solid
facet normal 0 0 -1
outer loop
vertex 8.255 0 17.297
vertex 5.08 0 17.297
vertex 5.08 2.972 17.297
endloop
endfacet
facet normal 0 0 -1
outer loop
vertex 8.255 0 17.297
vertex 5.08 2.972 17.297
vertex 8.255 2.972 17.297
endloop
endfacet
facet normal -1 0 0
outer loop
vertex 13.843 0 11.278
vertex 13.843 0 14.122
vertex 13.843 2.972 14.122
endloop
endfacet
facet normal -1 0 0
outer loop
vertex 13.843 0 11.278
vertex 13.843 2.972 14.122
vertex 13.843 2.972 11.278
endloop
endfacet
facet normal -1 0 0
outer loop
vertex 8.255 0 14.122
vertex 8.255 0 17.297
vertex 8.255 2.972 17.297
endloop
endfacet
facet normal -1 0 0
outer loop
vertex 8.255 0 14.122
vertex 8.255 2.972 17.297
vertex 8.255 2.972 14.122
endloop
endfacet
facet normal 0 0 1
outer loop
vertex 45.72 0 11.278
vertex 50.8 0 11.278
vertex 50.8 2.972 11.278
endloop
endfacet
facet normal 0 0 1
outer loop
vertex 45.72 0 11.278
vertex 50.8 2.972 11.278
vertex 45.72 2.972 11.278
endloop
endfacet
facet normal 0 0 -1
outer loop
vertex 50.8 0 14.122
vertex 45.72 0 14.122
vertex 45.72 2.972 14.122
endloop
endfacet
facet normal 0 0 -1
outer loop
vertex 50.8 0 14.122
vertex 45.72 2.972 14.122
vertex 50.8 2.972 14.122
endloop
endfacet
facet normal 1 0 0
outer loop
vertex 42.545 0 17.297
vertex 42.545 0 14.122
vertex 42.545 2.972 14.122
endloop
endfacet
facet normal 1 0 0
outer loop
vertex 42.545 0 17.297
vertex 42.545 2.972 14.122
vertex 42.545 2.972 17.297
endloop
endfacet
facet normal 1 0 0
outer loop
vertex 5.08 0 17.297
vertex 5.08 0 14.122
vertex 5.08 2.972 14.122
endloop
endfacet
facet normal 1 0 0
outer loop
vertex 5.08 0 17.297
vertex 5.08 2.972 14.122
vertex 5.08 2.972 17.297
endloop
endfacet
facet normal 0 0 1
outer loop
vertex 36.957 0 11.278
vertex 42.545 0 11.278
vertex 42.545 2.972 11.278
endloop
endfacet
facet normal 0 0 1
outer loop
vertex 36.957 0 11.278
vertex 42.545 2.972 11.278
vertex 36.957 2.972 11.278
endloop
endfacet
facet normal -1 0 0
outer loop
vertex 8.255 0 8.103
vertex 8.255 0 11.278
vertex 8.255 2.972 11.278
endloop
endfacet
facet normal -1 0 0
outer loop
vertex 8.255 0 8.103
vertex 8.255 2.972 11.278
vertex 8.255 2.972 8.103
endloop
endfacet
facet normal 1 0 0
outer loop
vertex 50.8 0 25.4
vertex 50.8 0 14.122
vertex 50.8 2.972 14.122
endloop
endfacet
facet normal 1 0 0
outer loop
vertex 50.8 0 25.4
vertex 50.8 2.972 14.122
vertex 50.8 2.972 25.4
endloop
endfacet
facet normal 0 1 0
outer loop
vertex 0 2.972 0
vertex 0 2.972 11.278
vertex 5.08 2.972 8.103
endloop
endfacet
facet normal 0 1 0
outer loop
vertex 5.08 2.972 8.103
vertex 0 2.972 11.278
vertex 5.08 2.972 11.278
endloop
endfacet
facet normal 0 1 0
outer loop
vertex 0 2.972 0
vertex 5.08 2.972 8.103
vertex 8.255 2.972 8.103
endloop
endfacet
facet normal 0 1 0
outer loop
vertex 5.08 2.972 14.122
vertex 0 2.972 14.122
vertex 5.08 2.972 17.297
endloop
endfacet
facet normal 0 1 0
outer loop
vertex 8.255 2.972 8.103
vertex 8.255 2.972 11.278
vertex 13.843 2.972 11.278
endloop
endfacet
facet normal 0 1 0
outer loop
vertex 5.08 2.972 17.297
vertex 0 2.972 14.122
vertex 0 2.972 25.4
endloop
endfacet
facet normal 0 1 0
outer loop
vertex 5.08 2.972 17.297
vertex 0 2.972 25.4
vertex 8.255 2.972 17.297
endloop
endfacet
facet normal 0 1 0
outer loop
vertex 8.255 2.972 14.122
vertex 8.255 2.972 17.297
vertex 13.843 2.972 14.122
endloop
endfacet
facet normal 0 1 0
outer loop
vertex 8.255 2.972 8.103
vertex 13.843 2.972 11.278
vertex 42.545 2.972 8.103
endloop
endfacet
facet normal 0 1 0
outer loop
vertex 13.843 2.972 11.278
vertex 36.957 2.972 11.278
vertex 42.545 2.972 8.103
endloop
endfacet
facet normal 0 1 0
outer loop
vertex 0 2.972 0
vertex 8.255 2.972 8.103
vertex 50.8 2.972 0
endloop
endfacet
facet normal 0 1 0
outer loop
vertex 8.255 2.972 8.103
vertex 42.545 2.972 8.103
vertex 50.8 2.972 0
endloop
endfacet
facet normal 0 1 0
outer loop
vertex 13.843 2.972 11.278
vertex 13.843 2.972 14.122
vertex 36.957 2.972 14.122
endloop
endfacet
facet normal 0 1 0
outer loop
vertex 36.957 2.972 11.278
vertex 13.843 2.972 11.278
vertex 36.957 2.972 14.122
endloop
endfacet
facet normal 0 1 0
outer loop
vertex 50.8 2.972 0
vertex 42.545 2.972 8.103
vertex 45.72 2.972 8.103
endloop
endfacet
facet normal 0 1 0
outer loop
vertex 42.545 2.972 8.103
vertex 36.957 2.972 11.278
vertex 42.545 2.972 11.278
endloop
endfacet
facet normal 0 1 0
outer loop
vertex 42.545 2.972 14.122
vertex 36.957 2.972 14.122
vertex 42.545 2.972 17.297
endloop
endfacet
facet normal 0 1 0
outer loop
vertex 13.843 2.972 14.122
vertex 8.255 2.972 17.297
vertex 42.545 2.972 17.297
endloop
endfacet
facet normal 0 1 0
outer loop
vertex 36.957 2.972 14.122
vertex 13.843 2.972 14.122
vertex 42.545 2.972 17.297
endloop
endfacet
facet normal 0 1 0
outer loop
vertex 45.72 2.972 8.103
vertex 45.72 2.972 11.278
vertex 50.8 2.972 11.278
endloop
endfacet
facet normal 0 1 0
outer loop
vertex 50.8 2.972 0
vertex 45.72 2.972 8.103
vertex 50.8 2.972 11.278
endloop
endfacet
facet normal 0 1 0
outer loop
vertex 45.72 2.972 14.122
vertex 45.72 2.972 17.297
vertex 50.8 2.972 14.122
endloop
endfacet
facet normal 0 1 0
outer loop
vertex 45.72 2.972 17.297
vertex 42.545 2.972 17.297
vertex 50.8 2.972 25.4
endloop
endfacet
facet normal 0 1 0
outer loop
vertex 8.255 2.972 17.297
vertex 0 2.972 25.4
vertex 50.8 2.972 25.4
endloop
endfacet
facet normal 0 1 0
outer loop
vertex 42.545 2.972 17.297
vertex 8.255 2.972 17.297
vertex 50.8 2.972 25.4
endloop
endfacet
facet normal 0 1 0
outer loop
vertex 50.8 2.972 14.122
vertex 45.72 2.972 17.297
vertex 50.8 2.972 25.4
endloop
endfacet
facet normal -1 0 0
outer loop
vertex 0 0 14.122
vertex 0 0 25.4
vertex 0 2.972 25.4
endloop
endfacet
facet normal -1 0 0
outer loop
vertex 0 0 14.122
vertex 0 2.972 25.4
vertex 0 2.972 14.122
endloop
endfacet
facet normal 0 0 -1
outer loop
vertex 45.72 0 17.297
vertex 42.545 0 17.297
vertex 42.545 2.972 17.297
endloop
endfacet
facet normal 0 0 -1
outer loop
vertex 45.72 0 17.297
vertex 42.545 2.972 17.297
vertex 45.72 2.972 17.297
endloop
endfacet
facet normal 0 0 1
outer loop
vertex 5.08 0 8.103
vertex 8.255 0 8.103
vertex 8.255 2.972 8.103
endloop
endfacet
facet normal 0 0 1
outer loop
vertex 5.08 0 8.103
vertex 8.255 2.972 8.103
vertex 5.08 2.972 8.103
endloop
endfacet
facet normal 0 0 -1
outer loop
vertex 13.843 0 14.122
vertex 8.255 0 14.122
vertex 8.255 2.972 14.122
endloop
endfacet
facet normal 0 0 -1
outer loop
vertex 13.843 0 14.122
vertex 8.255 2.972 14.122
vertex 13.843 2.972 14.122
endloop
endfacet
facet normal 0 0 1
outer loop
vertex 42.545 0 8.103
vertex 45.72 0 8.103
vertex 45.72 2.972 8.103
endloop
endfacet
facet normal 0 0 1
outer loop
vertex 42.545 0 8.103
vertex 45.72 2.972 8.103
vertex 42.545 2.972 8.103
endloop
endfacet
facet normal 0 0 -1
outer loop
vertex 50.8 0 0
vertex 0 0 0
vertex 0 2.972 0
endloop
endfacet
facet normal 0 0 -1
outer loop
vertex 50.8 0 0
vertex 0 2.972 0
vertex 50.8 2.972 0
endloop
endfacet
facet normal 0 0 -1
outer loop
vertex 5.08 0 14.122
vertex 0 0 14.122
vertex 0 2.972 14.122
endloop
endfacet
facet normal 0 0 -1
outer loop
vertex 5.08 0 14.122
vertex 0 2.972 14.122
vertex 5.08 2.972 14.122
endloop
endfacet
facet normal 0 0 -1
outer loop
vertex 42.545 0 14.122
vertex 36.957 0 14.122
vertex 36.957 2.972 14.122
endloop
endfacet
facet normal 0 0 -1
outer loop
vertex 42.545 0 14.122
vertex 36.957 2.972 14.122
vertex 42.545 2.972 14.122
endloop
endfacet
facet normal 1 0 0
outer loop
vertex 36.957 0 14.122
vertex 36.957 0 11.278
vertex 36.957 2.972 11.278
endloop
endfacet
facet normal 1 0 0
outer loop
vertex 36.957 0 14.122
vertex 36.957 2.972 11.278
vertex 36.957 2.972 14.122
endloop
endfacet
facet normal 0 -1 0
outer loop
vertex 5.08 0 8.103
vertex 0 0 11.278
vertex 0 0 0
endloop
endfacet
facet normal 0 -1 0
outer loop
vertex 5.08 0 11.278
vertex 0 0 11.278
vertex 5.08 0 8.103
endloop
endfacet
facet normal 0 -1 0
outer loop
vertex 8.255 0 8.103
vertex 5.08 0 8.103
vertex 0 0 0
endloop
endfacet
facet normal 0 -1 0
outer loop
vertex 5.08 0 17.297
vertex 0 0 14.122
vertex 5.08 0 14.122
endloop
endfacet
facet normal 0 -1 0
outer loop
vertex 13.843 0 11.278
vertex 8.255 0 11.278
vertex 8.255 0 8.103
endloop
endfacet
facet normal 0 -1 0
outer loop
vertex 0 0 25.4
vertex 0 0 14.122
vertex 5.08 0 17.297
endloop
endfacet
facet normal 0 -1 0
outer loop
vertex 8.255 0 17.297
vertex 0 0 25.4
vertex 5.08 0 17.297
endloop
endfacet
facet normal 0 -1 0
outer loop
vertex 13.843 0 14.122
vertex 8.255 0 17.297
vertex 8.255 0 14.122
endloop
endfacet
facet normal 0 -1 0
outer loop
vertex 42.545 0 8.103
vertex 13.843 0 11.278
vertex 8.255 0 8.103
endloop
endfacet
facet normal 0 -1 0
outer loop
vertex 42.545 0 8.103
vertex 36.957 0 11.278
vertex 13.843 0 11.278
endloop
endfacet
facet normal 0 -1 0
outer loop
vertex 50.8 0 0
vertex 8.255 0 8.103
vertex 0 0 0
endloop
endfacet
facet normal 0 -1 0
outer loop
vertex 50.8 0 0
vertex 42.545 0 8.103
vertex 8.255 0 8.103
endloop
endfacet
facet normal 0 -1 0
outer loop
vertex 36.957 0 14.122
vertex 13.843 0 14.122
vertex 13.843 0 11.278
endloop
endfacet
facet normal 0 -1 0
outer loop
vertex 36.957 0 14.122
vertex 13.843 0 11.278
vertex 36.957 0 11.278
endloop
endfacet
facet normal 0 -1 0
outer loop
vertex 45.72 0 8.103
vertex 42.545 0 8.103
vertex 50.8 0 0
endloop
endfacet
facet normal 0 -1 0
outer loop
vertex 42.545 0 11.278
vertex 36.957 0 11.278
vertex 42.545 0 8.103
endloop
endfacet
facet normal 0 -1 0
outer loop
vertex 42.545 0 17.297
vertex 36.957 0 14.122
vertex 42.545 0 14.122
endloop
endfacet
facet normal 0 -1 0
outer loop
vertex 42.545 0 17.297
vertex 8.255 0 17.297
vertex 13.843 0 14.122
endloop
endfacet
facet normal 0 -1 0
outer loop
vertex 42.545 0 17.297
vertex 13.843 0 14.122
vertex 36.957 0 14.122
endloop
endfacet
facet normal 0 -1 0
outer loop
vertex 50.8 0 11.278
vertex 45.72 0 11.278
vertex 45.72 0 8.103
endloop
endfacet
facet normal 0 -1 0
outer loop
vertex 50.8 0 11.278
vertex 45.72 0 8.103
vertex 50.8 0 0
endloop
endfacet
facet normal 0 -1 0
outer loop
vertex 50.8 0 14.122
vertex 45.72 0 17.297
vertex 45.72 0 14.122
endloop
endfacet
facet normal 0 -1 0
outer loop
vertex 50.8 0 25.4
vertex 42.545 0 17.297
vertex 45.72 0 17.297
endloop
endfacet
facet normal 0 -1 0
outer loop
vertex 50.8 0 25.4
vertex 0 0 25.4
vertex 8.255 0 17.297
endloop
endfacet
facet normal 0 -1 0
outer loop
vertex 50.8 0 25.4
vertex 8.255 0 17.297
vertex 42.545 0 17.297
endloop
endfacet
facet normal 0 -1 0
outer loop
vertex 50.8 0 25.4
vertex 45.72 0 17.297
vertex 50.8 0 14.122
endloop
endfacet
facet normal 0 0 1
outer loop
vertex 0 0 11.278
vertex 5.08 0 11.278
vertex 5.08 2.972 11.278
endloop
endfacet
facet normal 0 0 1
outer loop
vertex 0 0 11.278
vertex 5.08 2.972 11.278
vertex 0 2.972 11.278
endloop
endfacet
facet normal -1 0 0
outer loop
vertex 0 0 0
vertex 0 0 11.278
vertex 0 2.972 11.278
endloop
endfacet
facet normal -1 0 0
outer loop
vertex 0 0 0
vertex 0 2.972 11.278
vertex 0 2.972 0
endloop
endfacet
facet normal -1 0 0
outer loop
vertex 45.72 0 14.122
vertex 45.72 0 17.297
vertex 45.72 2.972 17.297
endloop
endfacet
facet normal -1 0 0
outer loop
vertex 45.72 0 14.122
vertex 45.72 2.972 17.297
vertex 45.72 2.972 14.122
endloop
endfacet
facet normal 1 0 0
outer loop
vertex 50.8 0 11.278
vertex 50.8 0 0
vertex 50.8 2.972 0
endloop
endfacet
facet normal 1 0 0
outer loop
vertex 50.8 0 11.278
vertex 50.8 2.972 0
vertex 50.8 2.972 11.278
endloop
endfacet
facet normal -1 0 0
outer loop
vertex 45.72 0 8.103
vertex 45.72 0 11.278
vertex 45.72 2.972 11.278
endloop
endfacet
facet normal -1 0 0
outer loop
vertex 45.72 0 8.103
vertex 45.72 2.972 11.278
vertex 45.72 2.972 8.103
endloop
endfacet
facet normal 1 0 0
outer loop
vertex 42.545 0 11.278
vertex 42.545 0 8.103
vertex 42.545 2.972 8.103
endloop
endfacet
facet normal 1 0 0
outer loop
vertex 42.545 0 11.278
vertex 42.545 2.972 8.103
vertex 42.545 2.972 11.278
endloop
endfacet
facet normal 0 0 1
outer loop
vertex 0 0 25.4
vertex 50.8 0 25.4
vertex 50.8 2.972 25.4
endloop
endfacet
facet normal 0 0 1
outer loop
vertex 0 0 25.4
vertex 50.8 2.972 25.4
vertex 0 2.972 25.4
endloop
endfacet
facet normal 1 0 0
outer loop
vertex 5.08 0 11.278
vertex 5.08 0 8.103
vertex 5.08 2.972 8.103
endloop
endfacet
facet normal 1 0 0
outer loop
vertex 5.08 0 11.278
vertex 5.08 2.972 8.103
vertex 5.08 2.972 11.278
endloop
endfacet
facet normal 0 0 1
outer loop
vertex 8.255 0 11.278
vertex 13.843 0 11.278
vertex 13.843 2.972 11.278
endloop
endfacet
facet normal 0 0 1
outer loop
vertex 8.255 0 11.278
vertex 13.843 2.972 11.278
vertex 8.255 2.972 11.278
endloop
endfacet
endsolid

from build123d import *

# Parameters (mm, degrees)
F1_DEPTH = 2.9718


with BuildPart() as f1:
    # F0 (on Front) → F1 (new body)
    with BuildSketch(Plane.XZ):
        Polygon((0, 11.2776), (0, 0), (50.8, 0), (50.8, 11.2776), (45.72, 11.2776), (45.72, 8.1026), (42.545, 8.1026), (42.545, 11.2776), (36.957, 11.2776), (36.957, 14.1224), (42.545, 14.1224), (42.545, 17.2974), (45.72, 17.2974), (45.72, 14.1224), (50.8, 14.1224), (50.8, 25.4), (0, 25.4), (0, 14.1224), (5.08, 14.1224), (5.08, 17.2974), (8.255, 17.2974), (8.255, 14.1224), (13.843, 14.1224), (13.843, 11.2776), (8.255, 11.2776), (8.255, 8.1026), (5.08, 8.1026), (5.08, 11.2776), align=None)
    extrude(amount=-F1_DEPTH)


solid = f1.part
